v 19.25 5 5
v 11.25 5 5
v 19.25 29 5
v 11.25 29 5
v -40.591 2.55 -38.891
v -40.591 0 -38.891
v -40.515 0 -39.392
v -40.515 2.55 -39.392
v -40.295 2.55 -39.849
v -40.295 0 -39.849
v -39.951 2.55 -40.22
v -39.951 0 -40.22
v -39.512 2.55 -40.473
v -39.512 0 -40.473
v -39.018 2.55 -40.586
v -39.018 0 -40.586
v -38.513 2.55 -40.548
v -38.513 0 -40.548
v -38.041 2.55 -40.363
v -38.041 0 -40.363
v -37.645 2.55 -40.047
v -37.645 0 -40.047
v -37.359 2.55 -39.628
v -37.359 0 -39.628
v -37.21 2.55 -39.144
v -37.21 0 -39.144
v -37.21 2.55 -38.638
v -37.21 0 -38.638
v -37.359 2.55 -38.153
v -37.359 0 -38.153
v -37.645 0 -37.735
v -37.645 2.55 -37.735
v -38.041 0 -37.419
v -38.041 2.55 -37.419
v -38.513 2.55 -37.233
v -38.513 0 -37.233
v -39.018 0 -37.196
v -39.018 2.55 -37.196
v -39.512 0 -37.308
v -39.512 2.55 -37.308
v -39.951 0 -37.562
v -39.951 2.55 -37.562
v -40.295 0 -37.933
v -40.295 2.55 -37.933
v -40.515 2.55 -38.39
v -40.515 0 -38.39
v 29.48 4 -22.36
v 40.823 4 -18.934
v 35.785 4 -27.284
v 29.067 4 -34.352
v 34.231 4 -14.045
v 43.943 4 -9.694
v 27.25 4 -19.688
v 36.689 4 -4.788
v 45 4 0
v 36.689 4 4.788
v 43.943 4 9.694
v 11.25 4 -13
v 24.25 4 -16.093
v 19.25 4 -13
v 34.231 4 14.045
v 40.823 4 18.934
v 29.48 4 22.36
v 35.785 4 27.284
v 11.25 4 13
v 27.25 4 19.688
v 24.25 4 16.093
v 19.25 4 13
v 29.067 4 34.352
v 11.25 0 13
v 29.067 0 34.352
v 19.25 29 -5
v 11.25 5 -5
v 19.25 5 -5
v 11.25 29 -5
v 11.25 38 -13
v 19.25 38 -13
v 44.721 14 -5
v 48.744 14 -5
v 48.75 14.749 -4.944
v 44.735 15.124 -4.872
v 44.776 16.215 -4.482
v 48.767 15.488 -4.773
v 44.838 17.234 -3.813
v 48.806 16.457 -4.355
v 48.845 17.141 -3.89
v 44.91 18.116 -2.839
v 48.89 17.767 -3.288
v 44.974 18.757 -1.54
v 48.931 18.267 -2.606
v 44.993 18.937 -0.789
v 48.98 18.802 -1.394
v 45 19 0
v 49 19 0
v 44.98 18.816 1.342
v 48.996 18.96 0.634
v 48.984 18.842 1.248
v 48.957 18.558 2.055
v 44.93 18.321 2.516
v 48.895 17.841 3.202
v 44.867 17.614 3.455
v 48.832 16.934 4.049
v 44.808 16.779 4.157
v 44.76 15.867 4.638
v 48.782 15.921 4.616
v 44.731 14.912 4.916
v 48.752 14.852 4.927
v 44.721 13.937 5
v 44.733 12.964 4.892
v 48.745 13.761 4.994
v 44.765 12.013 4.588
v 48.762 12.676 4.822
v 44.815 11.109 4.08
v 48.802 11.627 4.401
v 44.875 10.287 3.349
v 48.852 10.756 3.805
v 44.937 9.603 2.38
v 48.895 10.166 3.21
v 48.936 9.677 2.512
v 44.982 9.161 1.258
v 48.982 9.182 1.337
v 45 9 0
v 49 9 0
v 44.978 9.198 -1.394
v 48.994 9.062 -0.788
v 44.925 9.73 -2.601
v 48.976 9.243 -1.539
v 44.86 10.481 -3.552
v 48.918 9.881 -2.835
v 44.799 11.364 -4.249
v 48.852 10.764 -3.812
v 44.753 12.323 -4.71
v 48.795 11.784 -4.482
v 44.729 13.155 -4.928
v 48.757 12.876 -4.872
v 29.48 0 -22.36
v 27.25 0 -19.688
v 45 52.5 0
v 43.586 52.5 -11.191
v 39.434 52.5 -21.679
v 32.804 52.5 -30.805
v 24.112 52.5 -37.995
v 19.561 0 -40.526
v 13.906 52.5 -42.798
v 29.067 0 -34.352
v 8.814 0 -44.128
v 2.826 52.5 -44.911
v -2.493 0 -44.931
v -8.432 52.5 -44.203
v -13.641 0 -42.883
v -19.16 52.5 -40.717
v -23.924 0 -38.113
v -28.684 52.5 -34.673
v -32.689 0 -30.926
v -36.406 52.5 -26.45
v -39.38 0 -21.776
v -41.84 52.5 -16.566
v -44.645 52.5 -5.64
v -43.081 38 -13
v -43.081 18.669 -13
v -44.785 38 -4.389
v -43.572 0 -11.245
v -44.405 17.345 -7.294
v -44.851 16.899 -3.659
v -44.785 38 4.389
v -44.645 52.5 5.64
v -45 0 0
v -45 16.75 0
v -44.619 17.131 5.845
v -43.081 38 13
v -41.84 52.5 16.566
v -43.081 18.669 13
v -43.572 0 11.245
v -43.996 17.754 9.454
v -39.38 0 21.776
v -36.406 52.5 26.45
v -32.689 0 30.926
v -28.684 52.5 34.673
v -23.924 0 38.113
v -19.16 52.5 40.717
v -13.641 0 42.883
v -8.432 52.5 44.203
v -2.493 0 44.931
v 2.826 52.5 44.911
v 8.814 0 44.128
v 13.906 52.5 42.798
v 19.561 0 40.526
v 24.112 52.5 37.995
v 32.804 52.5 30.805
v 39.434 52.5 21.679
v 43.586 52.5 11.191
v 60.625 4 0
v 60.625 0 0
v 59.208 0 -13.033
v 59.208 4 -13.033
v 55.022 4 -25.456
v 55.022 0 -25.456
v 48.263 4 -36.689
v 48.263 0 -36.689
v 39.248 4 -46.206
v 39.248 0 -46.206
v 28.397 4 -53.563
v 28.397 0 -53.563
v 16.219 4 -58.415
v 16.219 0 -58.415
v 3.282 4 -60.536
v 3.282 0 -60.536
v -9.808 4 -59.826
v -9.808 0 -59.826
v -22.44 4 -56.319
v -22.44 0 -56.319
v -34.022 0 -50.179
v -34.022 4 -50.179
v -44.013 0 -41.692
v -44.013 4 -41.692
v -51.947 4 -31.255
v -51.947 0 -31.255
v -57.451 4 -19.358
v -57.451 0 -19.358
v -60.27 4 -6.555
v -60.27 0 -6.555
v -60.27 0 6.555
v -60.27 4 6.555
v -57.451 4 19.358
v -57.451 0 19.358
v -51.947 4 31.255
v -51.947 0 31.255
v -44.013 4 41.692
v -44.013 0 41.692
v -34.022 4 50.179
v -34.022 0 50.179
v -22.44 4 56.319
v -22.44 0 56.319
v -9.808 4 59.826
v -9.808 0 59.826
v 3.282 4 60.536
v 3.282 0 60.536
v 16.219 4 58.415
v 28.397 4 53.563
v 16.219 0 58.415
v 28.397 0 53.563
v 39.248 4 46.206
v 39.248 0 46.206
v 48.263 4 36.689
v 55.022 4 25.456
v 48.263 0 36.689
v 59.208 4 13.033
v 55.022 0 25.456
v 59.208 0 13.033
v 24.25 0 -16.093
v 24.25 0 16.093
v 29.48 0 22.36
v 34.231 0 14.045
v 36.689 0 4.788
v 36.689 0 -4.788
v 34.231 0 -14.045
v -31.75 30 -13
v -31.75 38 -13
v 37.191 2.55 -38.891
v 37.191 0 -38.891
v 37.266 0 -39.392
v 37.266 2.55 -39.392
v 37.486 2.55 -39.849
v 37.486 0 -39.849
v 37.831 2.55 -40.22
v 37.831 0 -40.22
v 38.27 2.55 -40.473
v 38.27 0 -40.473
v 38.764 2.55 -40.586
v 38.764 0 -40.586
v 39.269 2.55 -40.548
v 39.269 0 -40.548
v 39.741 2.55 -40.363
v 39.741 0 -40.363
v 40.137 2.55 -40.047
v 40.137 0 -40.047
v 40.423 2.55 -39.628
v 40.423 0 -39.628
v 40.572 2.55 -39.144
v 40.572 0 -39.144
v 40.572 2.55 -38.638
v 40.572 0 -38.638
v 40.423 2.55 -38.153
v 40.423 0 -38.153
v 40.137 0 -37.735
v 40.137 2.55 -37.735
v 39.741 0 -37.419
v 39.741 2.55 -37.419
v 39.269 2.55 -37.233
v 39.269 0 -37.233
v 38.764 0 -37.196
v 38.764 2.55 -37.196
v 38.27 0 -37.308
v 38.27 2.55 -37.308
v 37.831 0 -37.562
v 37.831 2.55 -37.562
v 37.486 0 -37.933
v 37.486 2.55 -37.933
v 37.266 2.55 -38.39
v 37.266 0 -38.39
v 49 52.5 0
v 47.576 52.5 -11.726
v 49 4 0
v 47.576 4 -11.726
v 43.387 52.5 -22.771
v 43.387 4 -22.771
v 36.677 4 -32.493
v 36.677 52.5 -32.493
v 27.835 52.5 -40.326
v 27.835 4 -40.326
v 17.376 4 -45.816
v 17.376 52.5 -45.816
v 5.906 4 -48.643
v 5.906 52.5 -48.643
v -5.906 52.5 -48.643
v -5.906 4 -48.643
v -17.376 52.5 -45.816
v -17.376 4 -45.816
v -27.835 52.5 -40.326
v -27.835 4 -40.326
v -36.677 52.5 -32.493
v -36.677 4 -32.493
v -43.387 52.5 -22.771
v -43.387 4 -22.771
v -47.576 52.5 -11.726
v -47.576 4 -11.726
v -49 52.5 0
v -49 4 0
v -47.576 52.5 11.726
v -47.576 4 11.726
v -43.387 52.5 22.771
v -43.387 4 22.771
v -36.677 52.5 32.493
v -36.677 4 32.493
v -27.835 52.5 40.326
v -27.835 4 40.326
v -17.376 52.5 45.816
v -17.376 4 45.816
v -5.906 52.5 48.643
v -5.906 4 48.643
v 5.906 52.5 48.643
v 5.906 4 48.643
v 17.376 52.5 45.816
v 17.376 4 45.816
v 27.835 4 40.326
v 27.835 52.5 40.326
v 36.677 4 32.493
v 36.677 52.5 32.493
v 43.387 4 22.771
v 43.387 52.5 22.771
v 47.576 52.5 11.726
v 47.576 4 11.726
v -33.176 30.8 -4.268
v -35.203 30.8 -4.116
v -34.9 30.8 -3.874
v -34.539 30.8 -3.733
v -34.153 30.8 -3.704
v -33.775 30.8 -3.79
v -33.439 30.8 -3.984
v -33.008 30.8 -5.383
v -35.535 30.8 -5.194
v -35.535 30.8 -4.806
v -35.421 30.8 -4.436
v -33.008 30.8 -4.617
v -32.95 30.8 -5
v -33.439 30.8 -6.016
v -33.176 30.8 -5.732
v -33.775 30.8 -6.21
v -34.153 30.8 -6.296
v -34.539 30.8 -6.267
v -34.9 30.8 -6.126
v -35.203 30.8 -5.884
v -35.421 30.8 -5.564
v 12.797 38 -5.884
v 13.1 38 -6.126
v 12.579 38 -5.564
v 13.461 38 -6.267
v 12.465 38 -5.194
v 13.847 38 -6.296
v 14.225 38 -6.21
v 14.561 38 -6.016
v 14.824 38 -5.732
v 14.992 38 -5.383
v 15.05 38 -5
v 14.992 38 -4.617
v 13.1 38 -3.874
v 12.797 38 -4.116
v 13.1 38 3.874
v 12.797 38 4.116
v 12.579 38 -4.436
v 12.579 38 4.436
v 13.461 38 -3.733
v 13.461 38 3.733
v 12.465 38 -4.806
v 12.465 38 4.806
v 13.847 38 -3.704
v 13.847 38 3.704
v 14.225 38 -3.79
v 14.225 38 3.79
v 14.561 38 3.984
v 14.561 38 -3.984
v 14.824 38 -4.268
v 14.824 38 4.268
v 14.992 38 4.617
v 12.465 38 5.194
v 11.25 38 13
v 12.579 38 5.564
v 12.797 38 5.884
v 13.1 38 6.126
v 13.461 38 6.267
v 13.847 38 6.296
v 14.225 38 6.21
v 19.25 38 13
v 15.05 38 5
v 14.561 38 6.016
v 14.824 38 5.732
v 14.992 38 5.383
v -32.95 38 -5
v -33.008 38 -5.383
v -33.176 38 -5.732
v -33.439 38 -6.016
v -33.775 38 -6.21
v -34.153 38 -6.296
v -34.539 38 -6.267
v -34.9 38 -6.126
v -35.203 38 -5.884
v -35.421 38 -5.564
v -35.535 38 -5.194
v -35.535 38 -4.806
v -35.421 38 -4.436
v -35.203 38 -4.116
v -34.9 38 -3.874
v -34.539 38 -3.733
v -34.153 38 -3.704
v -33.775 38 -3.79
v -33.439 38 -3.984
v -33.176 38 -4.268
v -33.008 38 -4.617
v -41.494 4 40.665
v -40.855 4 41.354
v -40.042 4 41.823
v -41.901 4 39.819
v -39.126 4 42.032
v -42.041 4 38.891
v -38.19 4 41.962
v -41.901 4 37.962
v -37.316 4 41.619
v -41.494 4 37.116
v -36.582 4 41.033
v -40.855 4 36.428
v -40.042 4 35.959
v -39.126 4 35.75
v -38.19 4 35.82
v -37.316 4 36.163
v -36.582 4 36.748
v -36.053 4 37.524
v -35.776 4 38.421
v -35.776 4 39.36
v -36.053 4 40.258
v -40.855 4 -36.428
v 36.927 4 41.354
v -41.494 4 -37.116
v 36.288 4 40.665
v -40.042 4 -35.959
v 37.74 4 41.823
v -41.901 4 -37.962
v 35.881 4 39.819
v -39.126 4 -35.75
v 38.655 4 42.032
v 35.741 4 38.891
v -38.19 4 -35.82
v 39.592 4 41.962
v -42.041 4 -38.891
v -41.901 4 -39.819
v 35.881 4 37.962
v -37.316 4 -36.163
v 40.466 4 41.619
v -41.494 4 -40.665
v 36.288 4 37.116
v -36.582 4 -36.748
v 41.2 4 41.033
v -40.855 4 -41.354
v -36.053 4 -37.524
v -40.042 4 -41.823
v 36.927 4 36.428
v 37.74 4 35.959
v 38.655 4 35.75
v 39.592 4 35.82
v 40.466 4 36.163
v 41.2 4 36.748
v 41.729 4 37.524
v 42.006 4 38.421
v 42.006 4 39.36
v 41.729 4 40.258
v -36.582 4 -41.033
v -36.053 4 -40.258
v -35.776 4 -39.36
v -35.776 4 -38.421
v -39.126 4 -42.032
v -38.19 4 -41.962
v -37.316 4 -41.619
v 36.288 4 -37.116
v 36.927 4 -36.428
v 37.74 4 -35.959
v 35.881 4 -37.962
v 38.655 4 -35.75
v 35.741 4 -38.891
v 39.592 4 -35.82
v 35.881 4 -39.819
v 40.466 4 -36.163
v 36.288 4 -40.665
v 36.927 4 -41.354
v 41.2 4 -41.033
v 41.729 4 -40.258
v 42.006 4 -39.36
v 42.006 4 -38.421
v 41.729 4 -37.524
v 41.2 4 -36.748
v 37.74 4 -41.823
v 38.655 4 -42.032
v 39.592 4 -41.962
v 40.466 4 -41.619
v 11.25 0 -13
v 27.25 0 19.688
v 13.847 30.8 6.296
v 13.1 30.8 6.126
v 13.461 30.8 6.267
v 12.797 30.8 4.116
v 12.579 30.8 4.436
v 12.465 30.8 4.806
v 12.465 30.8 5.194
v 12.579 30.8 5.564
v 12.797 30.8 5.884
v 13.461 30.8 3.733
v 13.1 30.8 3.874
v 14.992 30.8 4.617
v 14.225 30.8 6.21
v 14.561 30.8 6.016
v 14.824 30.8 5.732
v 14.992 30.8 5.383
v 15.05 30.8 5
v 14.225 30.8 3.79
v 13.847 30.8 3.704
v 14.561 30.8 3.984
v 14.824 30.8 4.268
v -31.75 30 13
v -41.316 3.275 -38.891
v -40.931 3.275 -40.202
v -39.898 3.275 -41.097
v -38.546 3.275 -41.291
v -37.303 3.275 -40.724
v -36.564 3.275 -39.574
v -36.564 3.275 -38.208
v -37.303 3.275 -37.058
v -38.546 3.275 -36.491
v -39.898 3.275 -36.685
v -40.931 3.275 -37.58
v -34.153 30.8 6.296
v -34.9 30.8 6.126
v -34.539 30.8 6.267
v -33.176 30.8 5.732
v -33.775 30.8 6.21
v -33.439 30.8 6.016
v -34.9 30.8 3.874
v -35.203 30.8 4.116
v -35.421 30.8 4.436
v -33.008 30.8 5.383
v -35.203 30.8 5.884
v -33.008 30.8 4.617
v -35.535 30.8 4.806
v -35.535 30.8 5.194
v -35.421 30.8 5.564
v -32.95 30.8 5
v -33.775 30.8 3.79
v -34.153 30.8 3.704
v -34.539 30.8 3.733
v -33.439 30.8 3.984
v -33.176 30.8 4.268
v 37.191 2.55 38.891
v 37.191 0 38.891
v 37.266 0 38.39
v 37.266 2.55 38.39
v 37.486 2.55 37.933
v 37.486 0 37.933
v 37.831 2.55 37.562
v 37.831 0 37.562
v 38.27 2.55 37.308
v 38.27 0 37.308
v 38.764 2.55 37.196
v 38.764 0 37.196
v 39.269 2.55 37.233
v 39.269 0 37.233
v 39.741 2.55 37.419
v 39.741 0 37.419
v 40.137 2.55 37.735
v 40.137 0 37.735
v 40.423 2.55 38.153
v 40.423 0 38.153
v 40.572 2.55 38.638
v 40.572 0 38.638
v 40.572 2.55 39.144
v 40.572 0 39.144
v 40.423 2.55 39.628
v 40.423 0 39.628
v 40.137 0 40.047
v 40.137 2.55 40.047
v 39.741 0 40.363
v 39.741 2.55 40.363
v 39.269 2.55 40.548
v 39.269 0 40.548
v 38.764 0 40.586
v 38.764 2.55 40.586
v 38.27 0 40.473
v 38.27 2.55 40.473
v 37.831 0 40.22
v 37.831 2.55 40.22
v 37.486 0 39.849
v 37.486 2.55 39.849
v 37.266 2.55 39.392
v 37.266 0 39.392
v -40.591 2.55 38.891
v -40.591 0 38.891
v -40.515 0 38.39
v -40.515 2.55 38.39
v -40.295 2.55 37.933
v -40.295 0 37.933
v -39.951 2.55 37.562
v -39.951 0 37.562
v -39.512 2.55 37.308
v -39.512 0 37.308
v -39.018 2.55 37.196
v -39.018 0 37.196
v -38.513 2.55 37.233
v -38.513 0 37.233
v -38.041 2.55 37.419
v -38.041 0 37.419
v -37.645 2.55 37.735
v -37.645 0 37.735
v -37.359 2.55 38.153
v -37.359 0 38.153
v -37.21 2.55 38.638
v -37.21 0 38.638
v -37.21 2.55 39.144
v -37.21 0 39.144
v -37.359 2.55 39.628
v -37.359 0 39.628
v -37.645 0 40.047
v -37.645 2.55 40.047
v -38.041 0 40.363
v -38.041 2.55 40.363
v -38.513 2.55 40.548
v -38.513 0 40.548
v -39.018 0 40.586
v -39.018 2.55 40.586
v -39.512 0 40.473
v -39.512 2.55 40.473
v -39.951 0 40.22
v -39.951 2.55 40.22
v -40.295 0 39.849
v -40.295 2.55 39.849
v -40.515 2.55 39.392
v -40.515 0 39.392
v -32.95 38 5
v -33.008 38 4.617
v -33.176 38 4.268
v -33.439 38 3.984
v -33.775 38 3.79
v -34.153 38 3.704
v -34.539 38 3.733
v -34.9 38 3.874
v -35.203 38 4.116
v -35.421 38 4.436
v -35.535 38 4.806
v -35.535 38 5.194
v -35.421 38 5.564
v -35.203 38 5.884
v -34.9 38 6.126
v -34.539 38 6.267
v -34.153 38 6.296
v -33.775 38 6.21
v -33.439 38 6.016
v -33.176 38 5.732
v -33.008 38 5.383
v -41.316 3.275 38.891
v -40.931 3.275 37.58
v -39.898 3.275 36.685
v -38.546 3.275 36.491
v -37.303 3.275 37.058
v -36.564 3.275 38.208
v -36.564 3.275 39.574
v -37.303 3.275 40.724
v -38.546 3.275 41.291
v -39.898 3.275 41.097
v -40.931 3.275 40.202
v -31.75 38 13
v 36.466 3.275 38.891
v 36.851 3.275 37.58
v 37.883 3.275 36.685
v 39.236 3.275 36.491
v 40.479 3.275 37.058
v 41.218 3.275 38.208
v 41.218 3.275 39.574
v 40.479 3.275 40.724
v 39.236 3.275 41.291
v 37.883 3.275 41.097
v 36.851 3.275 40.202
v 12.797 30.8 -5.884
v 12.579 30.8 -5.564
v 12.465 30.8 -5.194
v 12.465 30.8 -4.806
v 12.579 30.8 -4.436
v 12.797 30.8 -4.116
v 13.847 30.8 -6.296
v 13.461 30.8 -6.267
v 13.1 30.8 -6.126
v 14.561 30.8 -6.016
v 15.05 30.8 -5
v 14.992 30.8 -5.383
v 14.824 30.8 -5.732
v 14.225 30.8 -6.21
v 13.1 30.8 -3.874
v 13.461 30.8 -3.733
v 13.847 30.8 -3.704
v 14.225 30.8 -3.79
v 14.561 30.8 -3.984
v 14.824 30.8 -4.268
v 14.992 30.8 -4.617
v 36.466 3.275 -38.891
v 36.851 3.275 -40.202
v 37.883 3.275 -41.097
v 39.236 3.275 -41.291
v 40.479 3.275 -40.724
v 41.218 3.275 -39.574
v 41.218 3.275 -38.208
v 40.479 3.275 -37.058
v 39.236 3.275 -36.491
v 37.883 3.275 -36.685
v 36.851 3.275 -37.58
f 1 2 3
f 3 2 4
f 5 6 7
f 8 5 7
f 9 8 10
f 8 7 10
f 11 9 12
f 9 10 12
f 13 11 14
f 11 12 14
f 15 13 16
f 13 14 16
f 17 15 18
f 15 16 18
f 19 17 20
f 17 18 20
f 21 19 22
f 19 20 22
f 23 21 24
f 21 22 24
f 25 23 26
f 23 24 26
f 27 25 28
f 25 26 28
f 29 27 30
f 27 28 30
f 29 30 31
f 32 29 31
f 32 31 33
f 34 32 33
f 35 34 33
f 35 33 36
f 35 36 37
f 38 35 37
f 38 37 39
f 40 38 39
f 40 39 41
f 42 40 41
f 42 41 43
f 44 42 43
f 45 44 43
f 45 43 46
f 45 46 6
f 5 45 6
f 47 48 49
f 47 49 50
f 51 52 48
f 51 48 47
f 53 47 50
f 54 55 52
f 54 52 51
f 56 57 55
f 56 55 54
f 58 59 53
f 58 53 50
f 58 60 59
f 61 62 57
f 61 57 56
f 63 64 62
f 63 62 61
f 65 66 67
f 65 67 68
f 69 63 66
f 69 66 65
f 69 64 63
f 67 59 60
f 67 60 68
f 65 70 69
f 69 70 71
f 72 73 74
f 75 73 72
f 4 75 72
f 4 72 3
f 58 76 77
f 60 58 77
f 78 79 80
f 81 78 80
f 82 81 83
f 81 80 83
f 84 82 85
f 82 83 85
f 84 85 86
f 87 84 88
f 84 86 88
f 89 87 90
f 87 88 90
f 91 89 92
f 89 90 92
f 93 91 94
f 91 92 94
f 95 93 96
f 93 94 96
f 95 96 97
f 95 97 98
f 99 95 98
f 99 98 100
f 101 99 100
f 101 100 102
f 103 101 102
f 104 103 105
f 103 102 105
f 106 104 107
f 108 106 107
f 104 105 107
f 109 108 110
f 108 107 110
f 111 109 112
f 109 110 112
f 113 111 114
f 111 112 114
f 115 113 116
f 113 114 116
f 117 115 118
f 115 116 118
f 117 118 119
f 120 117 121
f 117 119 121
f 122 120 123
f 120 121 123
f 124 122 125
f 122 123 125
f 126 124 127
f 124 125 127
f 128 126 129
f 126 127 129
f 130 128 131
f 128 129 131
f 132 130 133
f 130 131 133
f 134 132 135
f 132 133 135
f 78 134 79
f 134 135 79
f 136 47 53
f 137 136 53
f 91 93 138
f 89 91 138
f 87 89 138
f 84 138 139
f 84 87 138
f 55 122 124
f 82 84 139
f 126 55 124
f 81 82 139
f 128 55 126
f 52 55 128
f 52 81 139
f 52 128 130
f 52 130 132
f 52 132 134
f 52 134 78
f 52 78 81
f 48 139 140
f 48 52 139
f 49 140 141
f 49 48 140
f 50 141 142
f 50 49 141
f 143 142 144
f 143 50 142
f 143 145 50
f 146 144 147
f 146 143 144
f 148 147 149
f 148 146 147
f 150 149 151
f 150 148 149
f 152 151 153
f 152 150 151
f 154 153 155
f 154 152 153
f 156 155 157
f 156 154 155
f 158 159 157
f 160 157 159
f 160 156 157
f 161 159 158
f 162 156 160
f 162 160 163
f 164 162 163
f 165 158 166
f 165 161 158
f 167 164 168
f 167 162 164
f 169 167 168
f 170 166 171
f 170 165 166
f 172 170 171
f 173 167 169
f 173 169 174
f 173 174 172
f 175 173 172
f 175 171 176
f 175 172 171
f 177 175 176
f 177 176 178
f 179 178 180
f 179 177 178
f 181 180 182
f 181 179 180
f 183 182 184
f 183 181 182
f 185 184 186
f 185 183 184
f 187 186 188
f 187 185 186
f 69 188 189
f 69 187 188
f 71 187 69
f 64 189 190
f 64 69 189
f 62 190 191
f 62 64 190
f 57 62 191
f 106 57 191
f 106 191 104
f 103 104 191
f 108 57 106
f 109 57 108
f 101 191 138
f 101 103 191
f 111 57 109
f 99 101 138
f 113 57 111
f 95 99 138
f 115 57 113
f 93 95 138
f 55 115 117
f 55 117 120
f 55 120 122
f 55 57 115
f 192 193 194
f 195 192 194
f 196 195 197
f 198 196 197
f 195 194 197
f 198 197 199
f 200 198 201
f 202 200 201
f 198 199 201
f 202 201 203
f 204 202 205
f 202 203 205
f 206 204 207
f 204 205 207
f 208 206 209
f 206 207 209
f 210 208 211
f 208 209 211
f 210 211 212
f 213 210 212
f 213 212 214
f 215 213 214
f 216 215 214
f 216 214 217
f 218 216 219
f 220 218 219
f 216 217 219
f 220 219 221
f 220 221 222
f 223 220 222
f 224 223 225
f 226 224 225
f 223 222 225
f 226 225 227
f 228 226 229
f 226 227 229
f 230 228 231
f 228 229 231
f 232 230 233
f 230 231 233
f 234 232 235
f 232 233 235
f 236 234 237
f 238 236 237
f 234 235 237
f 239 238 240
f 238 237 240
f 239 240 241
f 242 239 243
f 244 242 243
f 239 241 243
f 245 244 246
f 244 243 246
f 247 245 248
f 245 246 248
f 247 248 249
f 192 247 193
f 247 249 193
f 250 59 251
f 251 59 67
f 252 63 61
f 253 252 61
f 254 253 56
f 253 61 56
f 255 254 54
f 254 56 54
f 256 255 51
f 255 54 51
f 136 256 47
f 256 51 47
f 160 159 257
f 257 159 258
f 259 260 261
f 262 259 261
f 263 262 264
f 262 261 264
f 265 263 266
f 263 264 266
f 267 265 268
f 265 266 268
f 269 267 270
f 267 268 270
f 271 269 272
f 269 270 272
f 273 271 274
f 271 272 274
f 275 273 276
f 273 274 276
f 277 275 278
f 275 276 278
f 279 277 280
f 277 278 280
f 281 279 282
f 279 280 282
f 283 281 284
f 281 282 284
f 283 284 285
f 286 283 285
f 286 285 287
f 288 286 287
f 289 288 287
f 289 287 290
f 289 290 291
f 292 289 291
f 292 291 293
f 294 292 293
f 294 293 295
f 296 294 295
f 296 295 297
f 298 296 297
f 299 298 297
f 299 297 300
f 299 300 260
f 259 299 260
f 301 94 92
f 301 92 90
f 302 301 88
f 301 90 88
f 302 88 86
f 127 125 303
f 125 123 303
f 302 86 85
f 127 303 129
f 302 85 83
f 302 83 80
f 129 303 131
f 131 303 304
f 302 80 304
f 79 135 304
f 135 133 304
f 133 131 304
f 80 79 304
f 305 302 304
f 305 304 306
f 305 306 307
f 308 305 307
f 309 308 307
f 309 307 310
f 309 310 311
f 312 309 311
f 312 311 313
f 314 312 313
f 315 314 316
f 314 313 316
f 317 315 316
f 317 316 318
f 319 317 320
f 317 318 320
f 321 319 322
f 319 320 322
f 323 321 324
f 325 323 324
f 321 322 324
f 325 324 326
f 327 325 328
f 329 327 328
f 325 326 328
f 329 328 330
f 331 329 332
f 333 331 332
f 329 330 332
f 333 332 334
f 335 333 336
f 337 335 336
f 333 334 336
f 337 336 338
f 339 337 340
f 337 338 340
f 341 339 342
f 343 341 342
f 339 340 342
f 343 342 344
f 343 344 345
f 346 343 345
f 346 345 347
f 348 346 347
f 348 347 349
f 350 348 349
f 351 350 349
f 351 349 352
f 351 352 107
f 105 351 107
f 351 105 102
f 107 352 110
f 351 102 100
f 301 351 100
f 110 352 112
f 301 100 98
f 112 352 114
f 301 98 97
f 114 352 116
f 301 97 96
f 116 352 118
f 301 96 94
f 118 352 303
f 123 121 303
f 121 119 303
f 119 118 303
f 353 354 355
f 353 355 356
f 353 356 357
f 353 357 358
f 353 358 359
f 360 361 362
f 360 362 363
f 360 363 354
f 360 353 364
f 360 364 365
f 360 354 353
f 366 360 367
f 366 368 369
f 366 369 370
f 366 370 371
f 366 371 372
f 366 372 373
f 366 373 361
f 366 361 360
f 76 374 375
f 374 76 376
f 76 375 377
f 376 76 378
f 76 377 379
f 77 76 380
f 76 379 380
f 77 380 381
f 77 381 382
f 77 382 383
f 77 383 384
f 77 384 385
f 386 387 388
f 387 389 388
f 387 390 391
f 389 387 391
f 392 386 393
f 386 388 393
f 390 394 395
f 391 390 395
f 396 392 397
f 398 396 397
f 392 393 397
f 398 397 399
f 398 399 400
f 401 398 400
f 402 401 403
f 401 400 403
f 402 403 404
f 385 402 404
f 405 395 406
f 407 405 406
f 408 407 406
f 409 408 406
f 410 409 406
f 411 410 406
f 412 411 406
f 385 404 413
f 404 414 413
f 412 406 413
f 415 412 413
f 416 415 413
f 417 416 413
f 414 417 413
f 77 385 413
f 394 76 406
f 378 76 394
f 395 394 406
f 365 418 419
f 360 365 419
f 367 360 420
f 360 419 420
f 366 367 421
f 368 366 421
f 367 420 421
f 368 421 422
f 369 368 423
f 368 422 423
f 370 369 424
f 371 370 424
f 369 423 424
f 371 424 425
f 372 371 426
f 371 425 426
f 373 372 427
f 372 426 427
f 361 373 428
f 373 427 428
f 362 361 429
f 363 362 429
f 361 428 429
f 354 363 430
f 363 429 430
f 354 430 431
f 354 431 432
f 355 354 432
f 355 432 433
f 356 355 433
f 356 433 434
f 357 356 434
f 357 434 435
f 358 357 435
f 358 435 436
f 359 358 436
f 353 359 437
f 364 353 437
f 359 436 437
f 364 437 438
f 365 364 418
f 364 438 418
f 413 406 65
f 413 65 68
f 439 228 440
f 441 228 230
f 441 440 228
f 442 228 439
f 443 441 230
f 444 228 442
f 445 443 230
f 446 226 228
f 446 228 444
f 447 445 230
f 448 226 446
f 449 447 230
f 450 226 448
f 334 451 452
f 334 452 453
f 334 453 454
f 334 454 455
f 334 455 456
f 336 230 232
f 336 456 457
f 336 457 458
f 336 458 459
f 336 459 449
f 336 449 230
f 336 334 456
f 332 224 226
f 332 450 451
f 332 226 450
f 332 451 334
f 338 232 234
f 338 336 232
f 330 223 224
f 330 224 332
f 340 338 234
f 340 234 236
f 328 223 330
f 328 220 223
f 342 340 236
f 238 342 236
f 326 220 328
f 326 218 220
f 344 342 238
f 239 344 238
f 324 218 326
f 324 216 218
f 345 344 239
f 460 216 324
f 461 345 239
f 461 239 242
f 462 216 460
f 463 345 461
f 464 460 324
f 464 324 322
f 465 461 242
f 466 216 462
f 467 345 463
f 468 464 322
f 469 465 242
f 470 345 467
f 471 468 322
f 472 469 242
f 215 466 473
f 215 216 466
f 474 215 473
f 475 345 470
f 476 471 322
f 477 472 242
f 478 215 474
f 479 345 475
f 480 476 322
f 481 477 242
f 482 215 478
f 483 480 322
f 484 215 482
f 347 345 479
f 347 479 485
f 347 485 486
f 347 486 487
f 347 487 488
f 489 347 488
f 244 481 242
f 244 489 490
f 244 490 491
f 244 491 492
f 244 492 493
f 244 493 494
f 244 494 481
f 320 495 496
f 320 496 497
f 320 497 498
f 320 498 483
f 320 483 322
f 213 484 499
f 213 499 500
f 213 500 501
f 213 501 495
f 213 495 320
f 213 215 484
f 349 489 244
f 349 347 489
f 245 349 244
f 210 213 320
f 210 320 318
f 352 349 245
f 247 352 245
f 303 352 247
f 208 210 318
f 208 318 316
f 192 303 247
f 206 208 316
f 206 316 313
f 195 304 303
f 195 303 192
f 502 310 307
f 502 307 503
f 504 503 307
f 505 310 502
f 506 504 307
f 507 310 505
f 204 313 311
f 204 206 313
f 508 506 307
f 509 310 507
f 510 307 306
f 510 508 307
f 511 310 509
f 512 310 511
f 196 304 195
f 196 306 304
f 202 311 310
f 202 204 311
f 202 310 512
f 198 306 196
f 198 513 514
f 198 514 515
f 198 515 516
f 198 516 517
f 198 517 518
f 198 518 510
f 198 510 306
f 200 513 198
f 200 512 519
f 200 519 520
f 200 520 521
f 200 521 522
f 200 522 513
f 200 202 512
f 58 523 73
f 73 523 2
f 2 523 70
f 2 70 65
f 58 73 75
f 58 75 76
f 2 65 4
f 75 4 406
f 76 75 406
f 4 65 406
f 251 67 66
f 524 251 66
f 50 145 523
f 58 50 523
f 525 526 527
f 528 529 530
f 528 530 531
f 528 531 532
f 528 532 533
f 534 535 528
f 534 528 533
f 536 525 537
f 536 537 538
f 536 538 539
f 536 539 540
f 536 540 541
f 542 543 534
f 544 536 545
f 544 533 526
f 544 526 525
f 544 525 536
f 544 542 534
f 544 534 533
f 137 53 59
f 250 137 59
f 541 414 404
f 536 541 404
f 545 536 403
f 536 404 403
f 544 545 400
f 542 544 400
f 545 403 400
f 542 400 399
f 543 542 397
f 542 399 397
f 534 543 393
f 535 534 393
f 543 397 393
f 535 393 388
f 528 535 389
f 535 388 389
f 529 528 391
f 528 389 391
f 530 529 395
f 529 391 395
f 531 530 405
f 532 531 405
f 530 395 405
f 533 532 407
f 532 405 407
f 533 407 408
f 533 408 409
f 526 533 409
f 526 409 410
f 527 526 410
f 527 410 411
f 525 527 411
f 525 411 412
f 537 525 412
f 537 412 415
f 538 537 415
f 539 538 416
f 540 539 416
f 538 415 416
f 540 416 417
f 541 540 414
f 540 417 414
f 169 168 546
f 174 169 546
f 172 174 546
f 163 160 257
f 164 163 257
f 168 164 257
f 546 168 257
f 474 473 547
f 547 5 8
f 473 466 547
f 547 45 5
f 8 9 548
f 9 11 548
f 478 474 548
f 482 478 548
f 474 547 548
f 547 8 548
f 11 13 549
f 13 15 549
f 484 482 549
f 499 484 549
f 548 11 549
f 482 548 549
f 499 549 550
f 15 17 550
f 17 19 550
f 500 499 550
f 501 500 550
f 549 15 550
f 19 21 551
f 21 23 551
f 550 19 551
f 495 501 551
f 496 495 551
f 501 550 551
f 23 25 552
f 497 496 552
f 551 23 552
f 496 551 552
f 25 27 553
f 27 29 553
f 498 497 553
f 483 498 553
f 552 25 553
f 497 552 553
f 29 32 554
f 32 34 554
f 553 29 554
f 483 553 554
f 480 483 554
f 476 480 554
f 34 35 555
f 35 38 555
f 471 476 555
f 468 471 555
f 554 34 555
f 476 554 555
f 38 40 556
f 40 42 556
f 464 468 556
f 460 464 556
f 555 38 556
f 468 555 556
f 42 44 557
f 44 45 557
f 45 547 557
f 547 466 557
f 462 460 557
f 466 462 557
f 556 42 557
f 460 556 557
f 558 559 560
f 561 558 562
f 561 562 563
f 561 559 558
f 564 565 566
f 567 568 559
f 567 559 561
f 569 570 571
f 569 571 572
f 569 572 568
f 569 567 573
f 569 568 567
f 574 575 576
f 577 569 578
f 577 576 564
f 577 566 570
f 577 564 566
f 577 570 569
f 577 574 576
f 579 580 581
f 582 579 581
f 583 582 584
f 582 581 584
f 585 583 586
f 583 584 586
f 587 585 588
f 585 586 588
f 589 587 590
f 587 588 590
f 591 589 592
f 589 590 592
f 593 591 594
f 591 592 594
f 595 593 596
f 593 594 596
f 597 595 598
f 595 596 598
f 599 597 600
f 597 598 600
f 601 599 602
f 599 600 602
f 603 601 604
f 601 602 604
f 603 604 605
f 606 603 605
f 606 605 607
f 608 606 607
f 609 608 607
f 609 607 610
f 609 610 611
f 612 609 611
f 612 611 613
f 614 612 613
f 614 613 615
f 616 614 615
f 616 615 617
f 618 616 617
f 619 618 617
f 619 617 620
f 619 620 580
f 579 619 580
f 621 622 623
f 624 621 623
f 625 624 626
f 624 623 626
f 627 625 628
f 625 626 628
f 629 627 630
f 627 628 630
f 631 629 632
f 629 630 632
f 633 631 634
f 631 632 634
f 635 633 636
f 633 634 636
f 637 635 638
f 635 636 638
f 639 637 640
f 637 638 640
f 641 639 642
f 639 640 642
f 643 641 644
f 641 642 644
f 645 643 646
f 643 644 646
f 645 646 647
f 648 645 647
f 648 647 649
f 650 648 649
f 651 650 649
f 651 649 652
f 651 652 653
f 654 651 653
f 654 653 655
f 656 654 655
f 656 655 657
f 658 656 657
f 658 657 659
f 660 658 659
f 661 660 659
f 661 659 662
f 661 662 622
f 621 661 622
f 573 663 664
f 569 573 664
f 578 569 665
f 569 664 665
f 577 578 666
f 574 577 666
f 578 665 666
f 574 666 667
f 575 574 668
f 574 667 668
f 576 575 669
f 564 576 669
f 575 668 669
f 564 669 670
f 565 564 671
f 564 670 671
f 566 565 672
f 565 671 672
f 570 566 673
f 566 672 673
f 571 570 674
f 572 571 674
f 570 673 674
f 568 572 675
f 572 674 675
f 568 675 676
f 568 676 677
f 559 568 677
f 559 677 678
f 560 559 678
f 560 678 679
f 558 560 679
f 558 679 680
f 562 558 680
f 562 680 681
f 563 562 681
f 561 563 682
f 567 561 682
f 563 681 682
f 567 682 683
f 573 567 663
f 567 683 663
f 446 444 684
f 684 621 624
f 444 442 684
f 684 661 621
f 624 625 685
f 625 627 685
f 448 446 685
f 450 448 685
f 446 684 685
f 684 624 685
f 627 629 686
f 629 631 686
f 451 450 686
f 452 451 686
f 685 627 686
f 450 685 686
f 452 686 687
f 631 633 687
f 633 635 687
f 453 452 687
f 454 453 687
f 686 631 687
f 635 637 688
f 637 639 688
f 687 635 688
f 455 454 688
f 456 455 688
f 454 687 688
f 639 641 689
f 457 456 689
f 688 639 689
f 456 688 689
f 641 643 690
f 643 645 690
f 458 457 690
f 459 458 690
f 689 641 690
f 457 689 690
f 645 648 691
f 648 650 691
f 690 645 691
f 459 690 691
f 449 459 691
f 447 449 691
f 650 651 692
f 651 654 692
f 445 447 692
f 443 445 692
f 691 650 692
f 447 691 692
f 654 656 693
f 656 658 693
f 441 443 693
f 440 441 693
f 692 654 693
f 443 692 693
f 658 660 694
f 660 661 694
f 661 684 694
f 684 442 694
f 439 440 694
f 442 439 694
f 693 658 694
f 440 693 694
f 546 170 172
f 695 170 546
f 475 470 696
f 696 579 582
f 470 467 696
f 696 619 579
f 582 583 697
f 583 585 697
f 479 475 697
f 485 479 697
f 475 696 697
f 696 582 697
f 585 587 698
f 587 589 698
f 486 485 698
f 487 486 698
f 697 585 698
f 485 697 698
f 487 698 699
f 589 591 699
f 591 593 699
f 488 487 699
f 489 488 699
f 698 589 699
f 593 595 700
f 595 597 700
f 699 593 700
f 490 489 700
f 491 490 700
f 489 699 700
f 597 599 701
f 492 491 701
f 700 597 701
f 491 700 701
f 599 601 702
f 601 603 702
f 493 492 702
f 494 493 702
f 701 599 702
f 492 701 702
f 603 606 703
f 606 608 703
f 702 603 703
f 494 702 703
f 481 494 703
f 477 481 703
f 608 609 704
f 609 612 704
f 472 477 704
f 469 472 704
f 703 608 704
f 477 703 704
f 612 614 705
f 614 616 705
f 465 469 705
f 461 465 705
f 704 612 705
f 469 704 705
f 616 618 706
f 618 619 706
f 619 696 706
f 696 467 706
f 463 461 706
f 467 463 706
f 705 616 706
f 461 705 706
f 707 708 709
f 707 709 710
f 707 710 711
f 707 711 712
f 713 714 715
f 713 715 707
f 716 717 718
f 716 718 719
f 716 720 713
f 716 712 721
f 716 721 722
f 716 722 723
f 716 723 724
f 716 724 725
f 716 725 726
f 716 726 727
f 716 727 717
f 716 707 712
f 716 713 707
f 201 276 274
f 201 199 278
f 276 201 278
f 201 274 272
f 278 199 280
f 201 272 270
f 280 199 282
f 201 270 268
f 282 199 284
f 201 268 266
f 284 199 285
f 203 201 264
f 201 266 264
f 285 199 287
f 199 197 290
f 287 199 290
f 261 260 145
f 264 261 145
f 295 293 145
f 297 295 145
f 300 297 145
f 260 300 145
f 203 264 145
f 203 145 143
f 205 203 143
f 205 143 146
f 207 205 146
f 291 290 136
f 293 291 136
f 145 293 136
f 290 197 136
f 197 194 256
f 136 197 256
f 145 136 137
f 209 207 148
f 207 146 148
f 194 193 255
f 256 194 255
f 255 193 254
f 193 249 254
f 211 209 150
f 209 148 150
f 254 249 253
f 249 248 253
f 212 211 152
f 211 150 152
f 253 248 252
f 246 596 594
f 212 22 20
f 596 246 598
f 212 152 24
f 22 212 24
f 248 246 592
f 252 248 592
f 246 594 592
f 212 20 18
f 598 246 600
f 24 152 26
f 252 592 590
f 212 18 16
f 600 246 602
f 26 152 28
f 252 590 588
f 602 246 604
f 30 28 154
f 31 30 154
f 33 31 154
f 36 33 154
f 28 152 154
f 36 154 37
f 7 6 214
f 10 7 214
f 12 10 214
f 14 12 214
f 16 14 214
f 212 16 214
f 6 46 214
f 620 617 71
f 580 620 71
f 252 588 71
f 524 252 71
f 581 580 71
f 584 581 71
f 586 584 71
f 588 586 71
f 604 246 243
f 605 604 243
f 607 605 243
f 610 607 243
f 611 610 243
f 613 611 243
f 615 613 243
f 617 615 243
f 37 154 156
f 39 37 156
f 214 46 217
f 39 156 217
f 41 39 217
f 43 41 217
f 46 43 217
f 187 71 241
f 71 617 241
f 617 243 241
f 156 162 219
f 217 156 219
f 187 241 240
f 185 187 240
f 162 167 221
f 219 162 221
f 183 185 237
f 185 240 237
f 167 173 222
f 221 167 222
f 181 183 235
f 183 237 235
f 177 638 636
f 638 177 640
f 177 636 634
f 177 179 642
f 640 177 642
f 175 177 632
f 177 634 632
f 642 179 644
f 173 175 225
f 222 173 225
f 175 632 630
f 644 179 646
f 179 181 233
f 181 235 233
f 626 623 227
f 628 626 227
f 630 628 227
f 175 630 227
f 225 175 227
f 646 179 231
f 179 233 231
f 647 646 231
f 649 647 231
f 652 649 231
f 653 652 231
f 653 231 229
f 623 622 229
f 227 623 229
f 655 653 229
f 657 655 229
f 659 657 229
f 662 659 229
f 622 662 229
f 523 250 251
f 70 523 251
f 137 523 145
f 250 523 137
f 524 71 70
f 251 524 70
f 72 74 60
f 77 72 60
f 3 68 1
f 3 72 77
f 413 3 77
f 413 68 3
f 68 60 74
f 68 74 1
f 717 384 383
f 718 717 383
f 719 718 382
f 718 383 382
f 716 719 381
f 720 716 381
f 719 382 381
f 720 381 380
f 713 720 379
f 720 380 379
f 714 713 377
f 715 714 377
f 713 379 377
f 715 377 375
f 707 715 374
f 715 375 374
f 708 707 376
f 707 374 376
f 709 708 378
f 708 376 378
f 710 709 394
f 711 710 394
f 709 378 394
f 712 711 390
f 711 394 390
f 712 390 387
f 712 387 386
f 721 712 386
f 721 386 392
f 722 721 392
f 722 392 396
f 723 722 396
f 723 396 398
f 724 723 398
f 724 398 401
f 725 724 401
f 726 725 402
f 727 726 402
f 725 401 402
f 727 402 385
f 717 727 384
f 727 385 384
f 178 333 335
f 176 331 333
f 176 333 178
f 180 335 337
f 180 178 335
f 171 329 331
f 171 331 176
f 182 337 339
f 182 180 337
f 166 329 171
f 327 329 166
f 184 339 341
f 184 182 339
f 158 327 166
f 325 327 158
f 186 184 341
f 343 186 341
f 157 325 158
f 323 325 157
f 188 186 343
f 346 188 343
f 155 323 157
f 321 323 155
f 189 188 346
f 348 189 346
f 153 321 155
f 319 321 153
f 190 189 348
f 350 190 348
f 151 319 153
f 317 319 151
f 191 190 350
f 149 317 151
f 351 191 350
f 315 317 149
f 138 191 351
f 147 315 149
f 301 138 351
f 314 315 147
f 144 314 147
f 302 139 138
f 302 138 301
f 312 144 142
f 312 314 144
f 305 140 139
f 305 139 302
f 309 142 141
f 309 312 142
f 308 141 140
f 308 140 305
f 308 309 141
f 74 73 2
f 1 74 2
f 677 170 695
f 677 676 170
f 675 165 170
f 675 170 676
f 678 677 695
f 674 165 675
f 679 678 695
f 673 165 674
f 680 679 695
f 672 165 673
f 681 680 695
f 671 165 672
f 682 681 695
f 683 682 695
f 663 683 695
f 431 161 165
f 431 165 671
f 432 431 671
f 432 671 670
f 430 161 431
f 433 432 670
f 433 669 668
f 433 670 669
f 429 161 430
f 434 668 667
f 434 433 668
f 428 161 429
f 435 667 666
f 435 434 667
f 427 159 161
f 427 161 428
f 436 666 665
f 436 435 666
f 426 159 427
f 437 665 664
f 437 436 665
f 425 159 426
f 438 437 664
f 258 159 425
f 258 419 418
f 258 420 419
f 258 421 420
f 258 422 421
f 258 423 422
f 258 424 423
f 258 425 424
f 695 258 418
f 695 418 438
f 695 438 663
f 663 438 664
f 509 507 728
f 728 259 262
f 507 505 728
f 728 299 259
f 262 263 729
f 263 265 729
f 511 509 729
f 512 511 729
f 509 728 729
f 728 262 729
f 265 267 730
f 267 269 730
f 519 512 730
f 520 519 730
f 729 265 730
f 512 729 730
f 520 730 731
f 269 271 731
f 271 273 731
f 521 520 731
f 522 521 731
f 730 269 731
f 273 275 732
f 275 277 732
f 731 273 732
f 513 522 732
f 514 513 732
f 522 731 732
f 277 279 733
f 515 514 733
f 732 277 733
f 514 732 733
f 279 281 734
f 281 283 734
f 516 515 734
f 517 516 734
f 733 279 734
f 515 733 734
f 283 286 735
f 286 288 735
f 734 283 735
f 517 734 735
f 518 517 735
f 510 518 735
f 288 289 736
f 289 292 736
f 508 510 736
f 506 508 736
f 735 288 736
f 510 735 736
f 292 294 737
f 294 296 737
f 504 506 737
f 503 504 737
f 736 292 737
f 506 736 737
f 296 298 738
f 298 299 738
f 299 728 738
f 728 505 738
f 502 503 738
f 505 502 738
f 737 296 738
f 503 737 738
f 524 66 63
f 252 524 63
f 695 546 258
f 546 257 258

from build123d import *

# Parameters (mm, degrees)
SKETCH1_R                                           = 60.625
SKETCH1_R_2                                         = 45
BOSS_EXTRUDE1_DEPTH                                 = 4
SKETCH2_R                                           = 49
SKETCH2_R_2                                         = 45
BOSS_EXTRUDE2_DEPTH                                 = 52
SKETCH4_W                                           = 13.25
SKETCH4_H                                           = 8
SKETCH4_W_2                                         = 8
SKETCH4_H_2                                         = 38
BOSS_EXTRUDE4_DEPTH                                 = 13
BOSS_EXTRUDE5_DEPTH                                 = 4
SKETCH7_R                                           = 1.3
CUT_EXTRUDE4_DEPTH                                  = 7.2
SKETCH9_W                                           = 10
SKETCH9_H                                           = 24
CUT_EXTRUDE7_DEPTH                                  = 8
CUT_EXTRUDE8_REACH                                  = 111.625
SKETCH11_R                                          = 5
CUT_EXTRUDE9_DEPTH                                  = 5.0000001
CSK_FOR_M3_COUNTERSUNK_FLAT_HEAD_SCREW1_D           = 3.4
CSK_FOR_M3_COUNTERSUNK_FLAT_HEAD_SCREW1_DEPTH       = 4
CSK_FOR_M3_COUNTERSUNK_FLAT_HEAD_SCREW1_CSINK_D     = 6.3
CSK_FOR_M3_COUNTERSUNK_FLAT_HEAD_SCREW1_CSINK_ANGLE = 90
SKETCH18_W                                          = 98
SKETCH18_H                                          = 7
CUT_EXTRUDE10_DEPTH                                 = 61.625
CUT_EXTRUDE10_DEPTH_BACK                            = 61.625


with BuildPart() as part:
    # Sketch1 → Boss-Extrude1 (new body)
    with BuildSketch(Plane(origin=(0, 0, 0), x_dir=(1, 0, 0), z_dir=(0, 1, 0))):
        Circle(SKETCH1_R)
        Circle(SKETCH1_R_2, mode=Mode.SUBTRACT)
    extrude(amount=BOSS_EXTRUDE1_DEPTH)

    # Sketch2 → Boss-Extrude2 (add)
    with BuildSketch(Plane(origin=(0, 4, 0), x_dir=(1, 0, 0), z_dir=(0, 1, 0))):
        Circle(SKETCH2_R)
        Circle(SKETCH2_R_2, mode=Mode.SUBTRACT)
    extrude(amount=BOSS_EXTRUDE2_DEPTH)

    # Sketch4 → Boss-Extrude4 (add, symmetric)
    with BuildSketch(Plane.XY):
        with Locations((-38.375, 34)):
            Rectangle(SKETCH4_W, SKETCH4_H)
        Polygon((-31.75, 30), (-45, 30), (-45, 16.75), align=None)
        with Locations((15.25, 19)):
            Rectangle(SKETCH4_W_2, SKETCH4_H_2)
    extrude(amount=BOSS_EXTRUDE4_DEPTH, both=True)

    # Sketch5 → Boss-Extrude5 (add)
    with BuildSketch(Plane.XZ):
        with BuildLine():
            Line((11.25, 13), (29.067400866, 34.352382842))
            ThreePointArc((29.067400866, 34.352382842), (45, 0), (29.067400866, -34.352382842))
            Line((29.067400866, -34.352382842), (11.25, -13))
            Line((11.25, -13), (11.25, 13))
        make_face()
    extrude(amount=-BOSS_EXTRUDE5_DEPTH)

    # Sketch7 → Cut-Extrude4 (cut)
    with BuildSketch(Plane(origin=(0, 38, 0), x_dir=(1, 0, 0), z_dir=(0, 1, 0))):
        with Locations((-34.25, 5)):
            Circle(SKETCH7_R)
        with Locations((-34.25, -5)):
            Circle(SKETCH7_R)
        with Locations((13.75, 5)):
            Circle(SKETCH7_R)
        with Locations((13.75, -5)):
            Circle(SKETCH7_R)
    extrude(amount=-CUT_EXTRUDE4_DEPTH, mode=Mode.SUBTRACT)

    # Sketch9 → Cut-Extrude7 (cut)
    with BuildSketch(Plane.ZY.offset(-11.25)):
        with Locations((0, 17)):
            Rectangle(SKETCH9_W, SKETCH9_H)
    extrude(amount=-CUT_EXTRUDE7_DEPTH, mode=Mode.SUBTRACT)

    # Sketch11 → Cut-Extrude8 (cut, up to next)
    with BuildSketch(Plane(origin=(49, 0, 0), x_dir=(0, 0, -1), z_dir=(1, 0, 0)), mode=Mode.PRIVATE) as cut_extrude8_sk1:
        with Locations((0, 14)):
            Circle(SKETCH11_R)
    cut_extrude8_tool1 = extrude(cut_extrude8_sk1.sketch, amount=-CUT_EXTRUDE8_REACH, mode=Mode.PRIVATE) & part.part
    add(cut_extrude8_tool1.solids().sort_by_distance((49, 14, 0))[0], mode=Mode.SUBTRACT)

    # Sketch12 → Cut-Extrude9 (cut, through all)
    with BuildSketch(Plane(origin=(0, 4, 0), x_dir=(1, 0, 0), z_dir=(0, 1, 0))):
        with BuildLine():
            Line((29.479537487, 22.359715328), (27.25, 19.687836398))
            Line((27.25, 19.687836398), (27.25, -19.687836398))
            Line((27.25, -19.687836398), (29.479537487, -22.359715328))
            ThreePointArc((29.479537487, -22.359715328), (37, 0), (29.479537487, 22.359715328))
        make_face()
        Polygon((27.25, -19.687836398), (27.25, 19.687836398), (24.25, 16.092634774), (24.25, -16.092634774), align=None)
    extrude(amount=-CUT_EXTRUDE9_DEPTH, mode=Mode.SUBTRACT)

    # CSK for M3 Countersunk Flat Head Screw1
    with Locations(Plane(origin=(0, 4, 0), x_dir=(1, 0, 0), z_dir=(0, 1, 0))):
        with Locations((-38.890872965, 38.890872965), (-38.890872965, -38.890872965), (38.890872965, -38.890872965), (38.890872965, 38.890872965)):
            CounterSinkHole(CSK_FOR_M3_COUNTERSUNK_FLAT_HEAD_SCREW1_D / 2, CSK_FOR_M3_COUNTERSUNK_FLAT_HEAD_SCREW1_CSINK_D / 2, depth=CSK_FOR_M3_COUNTERSUNK_FLAT_HEAD_SCREW1_DEPTH, counter_sink_angle=CSK_FOR_M3_COUNTERSUNK_FLAT_HEAD_SCREW1_CSINK_ANGLE)

    # Sketch18 → Cut-Extrude10 (cut, two sides)
    with BuildSketch(Plane.XY) as cut_extrude10_sk:
        with Locations((0, 56)):
            Rectangle(SKETCH18_W, SKETCH18_H)
    extrude(amount=CUT_EXTRUDE10_DEPTH, mode=Mode.SUBTRACT)
    extrude(cut_extrude10_sk.sketch, amount=-CUT_EXTRUDE10_DEPTH_BACK, mode=Mode.SUBTRACT)


solid = part.part
